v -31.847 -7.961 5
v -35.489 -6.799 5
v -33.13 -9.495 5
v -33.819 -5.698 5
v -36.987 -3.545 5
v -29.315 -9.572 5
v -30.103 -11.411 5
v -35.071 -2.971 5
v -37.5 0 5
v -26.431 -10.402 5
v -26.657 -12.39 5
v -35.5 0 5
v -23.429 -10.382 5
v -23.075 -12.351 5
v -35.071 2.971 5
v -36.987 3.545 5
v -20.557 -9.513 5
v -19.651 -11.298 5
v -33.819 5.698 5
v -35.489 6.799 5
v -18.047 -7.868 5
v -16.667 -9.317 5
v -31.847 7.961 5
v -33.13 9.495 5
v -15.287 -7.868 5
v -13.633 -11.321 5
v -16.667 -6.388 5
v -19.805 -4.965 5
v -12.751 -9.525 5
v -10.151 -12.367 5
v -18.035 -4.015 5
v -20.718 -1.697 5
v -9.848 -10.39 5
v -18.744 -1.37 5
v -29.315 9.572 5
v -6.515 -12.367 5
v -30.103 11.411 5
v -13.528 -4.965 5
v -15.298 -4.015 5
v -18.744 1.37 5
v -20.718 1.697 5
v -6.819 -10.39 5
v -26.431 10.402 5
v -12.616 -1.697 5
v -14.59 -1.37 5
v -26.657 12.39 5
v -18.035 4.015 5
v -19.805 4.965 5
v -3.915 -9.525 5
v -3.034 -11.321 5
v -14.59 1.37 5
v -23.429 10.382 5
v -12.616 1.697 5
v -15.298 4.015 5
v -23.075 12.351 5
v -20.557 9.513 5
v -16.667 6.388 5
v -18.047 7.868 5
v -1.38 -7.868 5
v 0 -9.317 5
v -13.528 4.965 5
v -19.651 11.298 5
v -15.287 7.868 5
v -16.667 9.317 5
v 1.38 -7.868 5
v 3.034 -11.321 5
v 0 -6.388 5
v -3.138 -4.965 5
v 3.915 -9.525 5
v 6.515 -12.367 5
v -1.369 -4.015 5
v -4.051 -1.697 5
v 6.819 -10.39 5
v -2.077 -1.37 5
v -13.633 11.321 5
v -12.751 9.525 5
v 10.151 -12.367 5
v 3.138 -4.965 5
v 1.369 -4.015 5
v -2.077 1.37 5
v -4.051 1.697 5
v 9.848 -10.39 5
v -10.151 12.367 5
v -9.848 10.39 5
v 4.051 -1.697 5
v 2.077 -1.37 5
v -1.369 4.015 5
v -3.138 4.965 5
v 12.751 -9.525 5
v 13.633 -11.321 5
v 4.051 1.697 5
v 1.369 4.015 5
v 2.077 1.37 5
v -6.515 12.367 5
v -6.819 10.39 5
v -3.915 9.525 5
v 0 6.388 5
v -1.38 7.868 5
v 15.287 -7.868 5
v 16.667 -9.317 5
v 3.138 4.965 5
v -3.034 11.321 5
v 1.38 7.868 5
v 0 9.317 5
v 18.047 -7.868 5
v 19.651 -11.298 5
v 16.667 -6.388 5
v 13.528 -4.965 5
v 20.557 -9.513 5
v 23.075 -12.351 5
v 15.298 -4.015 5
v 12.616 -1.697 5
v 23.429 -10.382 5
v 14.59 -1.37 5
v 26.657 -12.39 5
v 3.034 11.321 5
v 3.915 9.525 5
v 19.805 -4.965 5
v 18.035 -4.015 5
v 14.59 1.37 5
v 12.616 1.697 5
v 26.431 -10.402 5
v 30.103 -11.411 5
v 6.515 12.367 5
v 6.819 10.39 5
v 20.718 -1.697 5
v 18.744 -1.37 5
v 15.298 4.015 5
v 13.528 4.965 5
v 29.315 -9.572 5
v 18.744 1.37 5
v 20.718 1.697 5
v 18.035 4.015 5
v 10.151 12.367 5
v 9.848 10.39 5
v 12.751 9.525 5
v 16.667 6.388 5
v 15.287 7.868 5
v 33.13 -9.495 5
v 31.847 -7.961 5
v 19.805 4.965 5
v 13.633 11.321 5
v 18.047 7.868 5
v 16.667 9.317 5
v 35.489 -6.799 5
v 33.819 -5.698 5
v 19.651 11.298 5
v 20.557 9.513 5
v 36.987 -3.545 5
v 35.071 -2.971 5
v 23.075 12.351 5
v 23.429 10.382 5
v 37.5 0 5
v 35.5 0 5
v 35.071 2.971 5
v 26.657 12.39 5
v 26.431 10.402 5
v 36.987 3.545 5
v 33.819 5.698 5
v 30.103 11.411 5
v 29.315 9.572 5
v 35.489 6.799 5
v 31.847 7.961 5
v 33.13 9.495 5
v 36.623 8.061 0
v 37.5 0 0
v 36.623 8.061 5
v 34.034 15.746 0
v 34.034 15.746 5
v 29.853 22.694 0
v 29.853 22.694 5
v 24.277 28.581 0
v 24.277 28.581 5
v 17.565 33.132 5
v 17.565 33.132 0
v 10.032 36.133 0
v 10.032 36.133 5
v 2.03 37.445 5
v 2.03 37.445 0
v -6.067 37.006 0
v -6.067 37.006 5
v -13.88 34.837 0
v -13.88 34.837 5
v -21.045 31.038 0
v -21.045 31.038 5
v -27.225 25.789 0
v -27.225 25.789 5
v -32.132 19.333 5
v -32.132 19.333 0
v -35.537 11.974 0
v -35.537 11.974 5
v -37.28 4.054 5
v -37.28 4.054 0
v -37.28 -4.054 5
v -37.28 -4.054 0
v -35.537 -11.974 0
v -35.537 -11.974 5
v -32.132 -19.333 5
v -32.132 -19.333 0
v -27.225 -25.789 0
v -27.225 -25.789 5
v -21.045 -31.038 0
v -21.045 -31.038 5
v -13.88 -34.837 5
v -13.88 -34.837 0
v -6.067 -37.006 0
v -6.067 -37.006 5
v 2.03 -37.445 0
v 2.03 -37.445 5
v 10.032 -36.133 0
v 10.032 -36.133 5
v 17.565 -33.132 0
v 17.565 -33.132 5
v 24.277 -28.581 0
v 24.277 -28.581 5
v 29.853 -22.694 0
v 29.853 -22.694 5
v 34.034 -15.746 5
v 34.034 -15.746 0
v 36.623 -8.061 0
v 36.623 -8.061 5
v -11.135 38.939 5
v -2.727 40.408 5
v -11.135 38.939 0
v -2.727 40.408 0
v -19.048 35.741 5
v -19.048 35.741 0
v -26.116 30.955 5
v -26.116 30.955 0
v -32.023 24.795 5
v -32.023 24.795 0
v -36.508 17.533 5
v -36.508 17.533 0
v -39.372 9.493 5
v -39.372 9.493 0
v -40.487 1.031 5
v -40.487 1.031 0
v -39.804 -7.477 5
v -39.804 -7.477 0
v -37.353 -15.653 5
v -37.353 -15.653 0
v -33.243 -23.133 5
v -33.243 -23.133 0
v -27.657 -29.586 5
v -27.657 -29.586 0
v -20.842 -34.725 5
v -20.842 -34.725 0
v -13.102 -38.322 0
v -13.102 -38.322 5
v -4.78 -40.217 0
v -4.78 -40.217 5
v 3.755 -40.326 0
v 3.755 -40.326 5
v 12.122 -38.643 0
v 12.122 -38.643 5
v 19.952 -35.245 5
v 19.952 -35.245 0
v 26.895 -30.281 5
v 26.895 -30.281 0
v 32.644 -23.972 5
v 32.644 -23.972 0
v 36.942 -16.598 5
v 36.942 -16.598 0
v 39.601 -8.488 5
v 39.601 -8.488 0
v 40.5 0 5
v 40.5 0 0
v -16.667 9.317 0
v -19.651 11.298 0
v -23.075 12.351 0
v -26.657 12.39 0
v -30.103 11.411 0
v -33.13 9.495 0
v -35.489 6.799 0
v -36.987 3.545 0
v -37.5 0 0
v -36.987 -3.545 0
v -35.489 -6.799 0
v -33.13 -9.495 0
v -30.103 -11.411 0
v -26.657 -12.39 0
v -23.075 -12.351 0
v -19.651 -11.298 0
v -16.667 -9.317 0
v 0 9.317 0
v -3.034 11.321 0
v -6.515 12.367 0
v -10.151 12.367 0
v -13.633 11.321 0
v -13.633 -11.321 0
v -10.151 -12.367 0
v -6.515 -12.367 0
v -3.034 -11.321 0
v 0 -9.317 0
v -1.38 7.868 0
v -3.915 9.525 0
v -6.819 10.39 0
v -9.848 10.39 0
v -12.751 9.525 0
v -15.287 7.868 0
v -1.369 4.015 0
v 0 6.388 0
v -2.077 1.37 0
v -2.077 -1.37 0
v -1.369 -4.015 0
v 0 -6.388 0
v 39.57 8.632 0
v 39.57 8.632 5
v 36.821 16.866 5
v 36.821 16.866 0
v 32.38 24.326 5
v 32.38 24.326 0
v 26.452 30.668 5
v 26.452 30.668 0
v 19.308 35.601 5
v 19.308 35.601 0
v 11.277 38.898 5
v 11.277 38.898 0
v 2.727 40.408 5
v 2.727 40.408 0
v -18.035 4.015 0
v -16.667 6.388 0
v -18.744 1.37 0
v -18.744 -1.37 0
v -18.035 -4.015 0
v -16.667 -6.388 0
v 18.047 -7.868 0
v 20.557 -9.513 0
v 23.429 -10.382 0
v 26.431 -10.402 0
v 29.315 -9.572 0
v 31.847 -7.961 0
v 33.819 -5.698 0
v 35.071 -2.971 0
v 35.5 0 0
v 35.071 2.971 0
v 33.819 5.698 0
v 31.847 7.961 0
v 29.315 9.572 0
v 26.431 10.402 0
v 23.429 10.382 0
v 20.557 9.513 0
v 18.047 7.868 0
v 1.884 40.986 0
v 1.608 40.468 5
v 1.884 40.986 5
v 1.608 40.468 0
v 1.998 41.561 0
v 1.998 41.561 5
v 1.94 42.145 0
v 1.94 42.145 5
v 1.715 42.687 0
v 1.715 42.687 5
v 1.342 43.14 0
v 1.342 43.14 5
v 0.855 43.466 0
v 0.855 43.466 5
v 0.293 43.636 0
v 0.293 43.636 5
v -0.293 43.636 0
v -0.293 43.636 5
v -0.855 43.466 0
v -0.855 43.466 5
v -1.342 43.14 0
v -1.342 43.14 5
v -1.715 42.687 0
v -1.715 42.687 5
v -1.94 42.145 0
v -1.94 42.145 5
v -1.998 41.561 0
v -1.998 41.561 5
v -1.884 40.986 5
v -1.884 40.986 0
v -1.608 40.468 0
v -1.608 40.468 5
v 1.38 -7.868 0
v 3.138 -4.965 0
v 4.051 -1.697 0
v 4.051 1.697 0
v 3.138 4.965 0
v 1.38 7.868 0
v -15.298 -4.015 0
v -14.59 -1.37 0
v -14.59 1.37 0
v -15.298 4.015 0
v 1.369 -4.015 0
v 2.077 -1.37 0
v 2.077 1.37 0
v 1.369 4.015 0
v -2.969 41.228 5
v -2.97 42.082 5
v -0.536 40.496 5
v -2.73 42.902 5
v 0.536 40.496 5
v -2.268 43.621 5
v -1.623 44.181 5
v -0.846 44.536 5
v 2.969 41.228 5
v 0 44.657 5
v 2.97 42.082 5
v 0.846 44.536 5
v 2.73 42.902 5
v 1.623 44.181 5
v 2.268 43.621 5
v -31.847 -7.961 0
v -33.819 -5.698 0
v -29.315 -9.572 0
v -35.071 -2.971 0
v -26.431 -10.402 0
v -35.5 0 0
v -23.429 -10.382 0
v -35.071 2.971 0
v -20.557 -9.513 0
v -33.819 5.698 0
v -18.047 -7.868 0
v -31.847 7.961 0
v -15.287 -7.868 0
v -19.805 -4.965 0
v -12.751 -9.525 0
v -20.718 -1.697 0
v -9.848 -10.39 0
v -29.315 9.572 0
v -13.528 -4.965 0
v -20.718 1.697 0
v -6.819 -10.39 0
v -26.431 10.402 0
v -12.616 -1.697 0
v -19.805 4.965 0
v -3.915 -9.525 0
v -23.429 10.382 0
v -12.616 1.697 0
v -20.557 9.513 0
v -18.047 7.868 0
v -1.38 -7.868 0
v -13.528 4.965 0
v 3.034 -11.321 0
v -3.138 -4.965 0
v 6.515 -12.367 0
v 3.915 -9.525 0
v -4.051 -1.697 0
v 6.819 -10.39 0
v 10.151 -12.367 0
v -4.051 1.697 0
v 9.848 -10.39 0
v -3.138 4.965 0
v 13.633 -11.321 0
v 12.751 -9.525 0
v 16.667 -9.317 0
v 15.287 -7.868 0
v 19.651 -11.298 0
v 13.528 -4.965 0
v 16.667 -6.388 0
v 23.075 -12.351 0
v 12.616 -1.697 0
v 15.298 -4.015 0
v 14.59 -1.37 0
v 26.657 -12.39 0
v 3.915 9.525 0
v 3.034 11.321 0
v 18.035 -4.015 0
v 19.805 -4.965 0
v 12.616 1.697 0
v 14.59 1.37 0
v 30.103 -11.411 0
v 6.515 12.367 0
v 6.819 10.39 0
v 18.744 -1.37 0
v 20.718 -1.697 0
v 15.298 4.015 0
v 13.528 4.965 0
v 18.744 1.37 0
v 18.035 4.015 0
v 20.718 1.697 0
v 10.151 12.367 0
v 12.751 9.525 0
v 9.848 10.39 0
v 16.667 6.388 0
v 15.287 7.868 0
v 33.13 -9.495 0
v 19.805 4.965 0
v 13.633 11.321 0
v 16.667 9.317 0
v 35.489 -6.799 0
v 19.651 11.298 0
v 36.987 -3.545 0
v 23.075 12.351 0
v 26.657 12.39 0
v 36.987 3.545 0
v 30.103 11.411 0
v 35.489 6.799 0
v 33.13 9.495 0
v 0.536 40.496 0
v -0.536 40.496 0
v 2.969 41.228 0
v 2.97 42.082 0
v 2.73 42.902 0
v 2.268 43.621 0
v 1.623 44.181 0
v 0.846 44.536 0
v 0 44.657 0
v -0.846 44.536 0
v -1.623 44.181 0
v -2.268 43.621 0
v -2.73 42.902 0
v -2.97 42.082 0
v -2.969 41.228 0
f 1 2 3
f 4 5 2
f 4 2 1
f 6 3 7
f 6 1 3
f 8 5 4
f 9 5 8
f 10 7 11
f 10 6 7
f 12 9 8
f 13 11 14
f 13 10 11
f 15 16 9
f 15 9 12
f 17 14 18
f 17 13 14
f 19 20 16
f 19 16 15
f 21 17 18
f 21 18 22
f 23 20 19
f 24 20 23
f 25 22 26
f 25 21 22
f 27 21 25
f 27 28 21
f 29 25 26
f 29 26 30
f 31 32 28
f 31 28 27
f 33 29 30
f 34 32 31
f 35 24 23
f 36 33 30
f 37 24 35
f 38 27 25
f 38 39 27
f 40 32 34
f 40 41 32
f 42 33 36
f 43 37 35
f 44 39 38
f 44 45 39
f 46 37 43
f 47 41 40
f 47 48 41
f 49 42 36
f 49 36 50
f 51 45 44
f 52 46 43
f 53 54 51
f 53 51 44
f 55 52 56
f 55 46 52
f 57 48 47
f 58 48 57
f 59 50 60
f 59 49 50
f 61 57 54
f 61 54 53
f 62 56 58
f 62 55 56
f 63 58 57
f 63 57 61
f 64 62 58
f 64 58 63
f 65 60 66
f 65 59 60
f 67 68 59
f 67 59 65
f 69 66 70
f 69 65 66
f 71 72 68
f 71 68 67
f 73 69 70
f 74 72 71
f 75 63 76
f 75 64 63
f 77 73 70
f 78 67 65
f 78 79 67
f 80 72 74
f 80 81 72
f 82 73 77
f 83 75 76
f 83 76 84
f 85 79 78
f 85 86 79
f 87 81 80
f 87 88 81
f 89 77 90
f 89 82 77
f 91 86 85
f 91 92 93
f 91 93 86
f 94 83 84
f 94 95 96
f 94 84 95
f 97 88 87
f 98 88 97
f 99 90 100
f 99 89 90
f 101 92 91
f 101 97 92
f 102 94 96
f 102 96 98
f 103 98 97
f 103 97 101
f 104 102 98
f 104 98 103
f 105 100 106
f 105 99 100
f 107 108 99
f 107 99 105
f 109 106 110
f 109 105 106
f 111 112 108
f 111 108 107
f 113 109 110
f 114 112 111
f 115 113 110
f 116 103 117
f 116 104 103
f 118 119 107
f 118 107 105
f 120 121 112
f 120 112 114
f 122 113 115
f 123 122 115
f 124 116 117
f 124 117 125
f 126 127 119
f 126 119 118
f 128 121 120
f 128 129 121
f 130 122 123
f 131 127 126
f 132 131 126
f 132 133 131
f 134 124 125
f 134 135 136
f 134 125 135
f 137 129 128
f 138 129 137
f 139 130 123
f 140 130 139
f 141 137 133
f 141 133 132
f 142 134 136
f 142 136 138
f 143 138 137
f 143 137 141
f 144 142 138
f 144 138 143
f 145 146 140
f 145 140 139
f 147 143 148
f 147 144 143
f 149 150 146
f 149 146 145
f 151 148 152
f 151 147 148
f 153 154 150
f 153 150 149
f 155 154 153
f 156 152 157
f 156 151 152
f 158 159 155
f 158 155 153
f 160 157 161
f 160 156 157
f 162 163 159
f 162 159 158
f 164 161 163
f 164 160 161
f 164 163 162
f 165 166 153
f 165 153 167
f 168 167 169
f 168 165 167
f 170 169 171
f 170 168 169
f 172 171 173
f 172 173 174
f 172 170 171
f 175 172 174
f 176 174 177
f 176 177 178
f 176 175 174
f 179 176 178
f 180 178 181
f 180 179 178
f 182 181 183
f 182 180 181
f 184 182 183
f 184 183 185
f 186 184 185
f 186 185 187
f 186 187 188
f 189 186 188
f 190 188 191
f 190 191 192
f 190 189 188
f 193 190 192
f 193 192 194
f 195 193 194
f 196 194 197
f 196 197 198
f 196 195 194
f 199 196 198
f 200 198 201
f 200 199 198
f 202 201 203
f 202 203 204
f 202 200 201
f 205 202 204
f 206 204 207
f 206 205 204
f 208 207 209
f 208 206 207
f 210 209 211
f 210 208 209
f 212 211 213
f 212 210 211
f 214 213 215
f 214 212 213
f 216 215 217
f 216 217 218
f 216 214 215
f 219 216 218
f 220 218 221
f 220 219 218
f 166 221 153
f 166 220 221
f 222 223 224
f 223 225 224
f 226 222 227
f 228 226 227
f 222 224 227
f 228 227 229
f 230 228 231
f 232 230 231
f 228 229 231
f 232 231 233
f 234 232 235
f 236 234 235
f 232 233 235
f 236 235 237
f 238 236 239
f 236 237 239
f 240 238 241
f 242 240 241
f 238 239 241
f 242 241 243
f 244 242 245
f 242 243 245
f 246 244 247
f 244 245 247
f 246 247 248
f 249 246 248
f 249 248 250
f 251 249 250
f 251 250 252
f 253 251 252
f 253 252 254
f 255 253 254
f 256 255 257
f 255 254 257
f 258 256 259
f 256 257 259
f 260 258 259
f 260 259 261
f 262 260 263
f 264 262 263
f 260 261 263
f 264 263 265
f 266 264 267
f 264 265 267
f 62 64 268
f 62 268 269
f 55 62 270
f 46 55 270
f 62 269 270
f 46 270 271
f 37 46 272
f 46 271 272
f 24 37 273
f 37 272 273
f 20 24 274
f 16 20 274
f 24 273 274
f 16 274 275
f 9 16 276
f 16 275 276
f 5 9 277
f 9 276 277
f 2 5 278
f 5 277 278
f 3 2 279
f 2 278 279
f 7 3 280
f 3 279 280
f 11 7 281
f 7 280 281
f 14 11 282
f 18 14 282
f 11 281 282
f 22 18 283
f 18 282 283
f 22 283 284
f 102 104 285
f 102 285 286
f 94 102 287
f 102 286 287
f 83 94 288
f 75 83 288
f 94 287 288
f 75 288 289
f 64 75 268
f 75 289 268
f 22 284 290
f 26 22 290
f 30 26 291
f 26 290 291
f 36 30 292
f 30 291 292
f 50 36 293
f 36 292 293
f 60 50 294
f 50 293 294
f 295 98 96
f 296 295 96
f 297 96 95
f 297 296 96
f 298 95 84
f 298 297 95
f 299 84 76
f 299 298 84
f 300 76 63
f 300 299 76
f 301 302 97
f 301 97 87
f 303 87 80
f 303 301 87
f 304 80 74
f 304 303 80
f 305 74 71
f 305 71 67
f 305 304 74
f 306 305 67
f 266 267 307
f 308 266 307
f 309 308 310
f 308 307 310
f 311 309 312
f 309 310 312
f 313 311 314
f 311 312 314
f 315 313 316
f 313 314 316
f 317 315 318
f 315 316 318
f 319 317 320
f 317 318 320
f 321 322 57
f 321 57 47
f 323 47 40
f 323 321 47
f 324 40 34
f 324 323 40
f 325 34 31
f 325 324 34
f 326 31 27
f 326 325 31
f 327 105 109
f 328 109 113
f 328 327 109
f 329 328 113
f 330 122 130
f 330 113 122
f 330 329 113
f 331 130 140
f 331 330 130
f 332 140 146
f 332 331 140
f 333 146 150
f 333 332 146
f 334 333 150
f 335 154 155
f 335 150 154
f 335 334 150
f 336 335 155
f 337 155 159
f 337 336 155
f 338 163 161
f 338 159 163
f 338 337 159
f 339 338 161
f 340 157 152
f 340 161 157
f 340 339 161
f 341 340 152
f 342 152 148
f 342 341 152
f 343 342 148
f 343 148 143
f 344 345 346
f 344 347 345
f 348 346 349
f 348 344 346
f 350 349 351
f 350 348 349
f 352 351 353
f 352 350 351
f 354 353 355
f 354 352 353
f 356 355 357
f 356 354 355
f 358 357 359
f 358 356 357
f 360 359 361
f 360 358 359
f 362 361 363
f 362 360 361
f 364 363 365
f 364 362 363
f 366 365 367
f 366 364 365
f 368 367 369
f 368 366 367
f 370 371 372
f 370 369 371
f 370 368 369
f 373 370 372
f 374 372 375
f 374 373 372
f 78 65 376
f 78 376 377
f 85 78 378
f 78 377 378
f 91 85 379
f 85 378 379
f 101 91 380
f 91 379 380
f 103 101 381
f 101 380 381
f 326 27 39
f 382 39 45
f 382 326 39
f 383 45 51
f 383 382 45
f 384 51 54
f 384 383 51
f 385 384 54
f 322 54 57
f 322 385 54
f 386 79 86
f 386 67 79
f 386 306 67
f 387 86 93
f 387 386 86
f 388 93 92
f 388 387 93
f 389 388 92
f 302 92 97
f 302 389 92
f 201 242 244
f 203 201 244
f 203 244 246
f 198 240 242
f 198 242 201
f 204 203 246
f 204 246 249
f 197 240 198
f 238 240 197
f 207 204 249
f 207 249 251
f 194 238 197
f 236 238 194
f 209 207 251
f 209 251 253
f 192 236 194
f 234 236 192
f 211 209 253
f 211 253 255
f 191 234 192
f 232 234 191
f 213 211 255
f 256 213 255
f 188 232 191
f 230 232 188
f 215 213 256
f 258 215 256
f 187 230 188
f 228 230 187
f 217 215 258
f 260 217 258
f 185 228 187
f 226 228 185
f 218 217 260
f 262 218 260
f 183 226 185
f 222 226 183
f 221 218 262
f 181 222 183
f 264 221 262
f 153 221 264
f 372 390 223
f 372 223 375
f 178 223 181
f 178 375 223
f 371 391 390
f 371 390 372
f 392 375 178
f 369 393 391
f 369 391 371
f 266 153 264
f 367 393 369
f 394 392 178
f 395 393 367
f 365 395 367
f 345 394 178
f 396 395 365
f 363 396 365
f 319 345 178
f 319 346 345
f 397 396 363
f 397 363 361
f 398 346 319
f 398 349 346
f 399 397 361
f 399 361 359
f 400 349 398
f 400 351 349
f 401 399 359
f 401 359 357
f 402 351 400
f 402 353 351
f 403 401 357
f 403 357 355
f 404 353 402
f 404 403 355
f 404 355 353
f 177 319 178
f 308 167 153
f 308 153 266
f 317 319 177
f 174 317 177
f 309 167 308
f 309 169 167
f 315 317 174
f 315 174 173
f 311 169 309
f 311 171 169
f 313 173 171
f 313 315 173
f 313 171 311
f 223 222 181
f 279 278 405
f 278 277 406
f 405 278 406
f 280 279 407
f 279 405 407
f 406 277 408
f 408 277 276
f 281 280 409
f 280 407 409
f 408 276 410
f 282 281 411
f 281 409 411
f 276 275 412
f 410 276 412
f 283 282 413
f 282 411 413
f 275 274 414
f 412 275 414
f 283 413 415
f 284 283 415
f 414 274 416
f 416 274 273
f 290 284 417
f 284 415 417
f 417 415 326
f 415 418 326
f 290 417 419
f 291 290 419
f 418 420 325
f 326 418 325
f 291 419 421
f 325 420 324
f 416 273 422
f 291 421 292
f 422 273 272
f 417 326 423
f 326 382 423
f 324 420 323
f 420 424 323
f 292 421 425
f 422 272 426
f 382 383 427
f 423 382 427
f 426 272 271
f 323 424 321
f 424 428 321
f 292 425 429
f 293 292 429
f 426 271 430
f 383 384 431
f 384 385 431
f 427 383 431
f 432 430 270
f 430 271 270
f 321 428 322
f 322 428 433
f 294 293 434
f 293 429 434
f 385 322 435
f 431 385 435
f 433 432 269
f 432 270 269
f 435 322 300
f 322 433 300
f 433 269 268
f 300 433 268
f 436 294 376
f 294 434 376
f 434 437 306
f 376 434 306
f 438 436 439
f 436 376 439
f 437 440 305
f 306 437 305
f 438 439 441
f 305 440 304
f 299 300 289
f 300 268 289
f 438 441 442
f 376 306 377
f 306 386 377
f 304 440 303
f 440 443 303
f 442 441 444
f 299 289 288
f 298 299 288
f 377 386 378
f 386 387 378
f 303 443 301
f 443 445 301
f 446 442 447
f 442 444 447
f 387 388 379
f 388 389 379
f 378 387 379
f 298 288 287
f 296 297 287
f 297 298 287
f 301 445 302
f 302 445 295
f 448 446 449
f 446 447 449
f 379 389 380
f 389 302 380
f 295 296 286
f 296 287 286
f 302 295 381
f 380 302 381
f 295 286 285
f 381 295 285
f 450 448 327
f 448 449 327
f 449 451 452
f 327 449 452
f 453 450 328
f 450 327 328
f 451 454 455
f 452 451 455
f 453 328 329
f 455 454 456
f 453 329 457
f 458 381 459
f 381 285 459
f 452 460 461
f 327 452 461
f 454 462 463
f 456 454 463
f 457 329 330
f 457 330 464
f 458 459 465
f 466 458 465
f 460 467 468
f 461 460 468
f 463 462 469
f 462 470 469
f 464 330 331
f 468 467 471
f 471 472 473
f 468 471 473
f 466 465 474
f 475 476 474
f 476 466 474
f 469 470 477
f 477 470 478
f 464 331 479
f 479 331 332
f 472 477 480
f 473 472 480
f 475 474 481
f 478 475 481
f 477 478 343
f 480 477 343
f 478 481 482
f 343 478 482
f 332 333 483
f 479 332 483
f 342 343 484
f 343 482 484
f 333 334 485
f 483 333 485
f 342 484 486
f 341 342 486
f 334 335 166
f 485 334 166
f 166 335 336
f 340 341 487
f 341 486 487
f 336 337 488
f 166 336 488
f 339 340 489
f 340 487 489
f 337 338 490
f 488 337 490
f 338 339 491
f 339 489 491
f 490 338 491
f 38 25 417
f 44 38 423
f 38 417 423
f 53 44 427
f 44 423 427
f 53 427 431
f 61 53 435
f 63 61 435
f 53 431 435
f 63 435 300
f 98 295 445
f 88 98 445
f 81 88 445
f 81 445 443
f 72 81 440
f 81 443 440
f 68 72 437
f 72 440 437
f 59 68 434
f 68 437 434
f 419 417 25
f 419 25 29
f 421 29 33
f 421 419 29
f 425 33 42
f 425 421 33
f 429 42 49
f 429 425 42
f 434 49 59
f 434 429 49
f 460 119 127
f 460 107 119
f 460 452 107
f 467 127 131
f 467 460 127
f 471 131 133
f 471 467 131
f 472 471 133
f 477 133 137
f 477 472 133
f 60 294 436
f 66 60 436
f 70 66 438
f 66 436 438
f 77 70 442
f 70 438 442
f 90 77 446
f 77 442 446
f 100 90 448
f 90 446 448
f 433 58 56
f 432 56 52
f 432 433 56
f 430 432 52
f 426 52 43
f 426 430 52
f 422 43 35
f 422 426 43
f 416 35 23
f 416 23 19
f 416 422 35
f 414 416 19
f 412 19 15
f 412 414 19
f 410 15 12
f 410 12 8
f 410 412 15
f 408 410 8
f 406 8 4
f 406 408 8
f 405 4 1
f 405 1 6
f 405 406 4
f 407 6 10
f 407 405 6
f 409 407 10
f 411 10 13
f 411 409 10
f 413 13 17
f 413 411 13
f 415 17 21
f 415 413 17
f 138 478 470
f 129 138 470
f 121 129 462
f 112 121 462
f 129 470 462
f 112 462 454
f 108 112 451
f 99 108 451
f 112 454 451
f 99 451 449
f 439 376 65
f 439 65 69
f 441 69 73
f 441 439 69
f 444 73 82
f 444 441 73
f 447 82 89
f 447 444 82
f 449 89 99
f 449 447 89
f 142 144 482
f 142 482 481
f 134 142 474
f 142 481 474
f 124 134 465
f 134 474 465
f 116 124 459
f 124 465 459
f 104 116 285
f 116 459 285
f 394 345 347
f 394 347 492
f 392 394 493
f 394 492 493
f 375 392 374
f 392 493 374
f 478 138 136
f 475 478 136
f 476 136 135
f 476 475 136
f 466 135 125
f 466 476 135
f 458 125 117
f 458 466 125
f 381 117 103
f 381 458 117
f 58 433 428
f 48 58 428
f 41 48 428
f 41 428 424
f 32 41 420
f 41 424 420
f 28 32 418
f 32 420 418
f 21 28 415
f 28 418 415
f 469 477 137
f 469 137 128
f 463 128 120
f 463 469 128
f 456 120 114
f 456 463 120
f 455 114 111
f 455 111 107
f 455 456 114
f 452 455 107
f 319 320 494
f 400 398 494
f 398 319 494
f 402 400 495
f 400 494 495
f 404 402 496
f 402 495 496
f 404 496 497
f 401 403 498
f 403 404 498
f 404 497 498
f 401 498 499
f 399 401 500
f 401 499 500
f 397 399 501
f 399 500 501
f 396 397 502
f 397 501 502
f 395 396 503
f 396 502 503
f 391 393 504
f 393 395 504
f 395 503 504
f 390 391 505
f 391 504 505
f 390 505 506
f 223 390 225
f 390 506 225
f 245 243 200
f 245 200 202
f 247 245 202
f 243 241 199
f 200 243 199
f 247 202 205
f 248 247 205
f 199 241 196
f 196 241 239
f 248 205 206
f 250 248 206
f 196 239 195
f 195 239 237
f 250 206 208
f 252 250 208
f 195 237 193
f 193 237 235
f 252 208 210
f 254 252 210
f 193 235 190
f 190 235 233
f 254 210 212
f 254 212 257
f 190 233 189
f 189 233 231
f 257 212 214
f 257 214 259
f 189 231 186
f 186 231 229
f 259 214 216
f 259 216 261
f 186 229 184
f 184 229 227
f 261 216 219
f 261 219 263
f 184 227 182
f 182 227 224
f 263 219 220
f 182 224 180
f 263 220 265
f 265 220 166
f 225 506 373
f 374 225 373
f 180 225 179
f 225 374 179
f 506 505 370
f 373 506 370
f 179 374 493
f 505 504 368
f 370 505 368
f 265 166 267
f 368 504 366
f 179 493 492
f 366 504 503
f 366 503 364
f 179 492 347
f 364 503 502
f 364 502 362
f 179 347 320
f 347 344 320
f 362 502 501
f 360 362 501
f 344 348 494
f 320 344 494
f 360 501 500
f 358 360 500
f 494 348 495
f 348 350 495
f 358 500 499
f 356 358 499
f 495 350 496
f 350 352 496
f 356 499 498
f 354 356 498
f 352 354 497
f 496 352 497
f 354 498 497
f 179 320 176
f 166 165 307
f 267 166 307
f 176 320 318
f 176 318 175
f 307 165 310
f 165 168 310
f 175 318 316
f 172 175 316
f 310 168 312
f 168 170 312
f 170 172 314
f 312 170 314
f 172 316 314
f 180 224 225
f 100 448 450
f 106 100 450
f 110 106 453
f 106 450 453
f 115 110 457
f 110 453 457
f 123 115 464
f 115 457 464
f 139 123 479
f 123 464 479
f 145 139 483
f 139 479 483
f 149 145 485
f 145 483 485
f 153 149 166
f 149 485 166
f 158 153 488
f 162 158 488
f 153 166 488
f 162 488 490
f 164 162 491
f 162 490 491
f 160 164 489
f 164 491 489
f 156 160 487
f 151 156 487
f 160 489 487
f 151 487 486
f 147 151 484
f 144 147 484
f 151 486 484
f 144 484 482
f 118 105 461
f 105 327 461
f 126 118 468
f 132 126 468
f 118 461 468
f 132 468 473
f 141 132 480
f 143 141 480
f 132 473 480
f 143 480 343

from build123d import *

# Parameters (mm, degrees)
SKETCH001_R         = 12.5
SKETCH001_R_2       = 10.5
PAD_DEPTH           = 5
LINEARPATTERN_COUNT = 4
LINEARPATTERN_PITCH = 16.666667
SKETCH_R            = 40.5
SKETCH_R_2          = 37.5
PAD001_DEPTH        = 5
SKETCH002_R         = 3
SKETCH002_R_2       = 2
PAD002_DEPTH        = 5


with BuildPart() as body:
    # Sketch001 → Pad (new body)
    with BuildSketch(Plane.XY):
        with Locations((-25, 0)):
            Circle(SKETCH001_R)
        with Locations((-25, 0)):
            Circle(SKETCH001_R_2, mode=Mode.SUBTRACT)
    pad = extrude(amount=PAD_DEPTH)

    # LinearPattern: Pad ×4
    with Locations(*[(i * LINEARPATTERN_PITCH, 0, 0) for i in range(1, LINEARPATTERN_COUNT)]):
        add(pad)


with BuildPart() as body001:
    # Sketch → Pad001 (new body)
    with BuildSketch(Plane.XY):
        Circle(SKETCH_R)
        Circle(SKETCH_R_2, mode=Mode.SUBTRACT)
    extrude(amount=PAD001_DEPTH)

    # Sketch002 → Pad002 (join)
    with BuildSketch(Plane.XY):
        with Locations((0, 41.657417)):
            Circle(SKETCH002_R)
        with Locations((0, 41.657417)):
            Circle(SKETCH002_R_2, mode=Mode.SUBTRACT)
    extrude(amount=PAD002_DEPTH)


solid = Compound([body.part, body001.part])
